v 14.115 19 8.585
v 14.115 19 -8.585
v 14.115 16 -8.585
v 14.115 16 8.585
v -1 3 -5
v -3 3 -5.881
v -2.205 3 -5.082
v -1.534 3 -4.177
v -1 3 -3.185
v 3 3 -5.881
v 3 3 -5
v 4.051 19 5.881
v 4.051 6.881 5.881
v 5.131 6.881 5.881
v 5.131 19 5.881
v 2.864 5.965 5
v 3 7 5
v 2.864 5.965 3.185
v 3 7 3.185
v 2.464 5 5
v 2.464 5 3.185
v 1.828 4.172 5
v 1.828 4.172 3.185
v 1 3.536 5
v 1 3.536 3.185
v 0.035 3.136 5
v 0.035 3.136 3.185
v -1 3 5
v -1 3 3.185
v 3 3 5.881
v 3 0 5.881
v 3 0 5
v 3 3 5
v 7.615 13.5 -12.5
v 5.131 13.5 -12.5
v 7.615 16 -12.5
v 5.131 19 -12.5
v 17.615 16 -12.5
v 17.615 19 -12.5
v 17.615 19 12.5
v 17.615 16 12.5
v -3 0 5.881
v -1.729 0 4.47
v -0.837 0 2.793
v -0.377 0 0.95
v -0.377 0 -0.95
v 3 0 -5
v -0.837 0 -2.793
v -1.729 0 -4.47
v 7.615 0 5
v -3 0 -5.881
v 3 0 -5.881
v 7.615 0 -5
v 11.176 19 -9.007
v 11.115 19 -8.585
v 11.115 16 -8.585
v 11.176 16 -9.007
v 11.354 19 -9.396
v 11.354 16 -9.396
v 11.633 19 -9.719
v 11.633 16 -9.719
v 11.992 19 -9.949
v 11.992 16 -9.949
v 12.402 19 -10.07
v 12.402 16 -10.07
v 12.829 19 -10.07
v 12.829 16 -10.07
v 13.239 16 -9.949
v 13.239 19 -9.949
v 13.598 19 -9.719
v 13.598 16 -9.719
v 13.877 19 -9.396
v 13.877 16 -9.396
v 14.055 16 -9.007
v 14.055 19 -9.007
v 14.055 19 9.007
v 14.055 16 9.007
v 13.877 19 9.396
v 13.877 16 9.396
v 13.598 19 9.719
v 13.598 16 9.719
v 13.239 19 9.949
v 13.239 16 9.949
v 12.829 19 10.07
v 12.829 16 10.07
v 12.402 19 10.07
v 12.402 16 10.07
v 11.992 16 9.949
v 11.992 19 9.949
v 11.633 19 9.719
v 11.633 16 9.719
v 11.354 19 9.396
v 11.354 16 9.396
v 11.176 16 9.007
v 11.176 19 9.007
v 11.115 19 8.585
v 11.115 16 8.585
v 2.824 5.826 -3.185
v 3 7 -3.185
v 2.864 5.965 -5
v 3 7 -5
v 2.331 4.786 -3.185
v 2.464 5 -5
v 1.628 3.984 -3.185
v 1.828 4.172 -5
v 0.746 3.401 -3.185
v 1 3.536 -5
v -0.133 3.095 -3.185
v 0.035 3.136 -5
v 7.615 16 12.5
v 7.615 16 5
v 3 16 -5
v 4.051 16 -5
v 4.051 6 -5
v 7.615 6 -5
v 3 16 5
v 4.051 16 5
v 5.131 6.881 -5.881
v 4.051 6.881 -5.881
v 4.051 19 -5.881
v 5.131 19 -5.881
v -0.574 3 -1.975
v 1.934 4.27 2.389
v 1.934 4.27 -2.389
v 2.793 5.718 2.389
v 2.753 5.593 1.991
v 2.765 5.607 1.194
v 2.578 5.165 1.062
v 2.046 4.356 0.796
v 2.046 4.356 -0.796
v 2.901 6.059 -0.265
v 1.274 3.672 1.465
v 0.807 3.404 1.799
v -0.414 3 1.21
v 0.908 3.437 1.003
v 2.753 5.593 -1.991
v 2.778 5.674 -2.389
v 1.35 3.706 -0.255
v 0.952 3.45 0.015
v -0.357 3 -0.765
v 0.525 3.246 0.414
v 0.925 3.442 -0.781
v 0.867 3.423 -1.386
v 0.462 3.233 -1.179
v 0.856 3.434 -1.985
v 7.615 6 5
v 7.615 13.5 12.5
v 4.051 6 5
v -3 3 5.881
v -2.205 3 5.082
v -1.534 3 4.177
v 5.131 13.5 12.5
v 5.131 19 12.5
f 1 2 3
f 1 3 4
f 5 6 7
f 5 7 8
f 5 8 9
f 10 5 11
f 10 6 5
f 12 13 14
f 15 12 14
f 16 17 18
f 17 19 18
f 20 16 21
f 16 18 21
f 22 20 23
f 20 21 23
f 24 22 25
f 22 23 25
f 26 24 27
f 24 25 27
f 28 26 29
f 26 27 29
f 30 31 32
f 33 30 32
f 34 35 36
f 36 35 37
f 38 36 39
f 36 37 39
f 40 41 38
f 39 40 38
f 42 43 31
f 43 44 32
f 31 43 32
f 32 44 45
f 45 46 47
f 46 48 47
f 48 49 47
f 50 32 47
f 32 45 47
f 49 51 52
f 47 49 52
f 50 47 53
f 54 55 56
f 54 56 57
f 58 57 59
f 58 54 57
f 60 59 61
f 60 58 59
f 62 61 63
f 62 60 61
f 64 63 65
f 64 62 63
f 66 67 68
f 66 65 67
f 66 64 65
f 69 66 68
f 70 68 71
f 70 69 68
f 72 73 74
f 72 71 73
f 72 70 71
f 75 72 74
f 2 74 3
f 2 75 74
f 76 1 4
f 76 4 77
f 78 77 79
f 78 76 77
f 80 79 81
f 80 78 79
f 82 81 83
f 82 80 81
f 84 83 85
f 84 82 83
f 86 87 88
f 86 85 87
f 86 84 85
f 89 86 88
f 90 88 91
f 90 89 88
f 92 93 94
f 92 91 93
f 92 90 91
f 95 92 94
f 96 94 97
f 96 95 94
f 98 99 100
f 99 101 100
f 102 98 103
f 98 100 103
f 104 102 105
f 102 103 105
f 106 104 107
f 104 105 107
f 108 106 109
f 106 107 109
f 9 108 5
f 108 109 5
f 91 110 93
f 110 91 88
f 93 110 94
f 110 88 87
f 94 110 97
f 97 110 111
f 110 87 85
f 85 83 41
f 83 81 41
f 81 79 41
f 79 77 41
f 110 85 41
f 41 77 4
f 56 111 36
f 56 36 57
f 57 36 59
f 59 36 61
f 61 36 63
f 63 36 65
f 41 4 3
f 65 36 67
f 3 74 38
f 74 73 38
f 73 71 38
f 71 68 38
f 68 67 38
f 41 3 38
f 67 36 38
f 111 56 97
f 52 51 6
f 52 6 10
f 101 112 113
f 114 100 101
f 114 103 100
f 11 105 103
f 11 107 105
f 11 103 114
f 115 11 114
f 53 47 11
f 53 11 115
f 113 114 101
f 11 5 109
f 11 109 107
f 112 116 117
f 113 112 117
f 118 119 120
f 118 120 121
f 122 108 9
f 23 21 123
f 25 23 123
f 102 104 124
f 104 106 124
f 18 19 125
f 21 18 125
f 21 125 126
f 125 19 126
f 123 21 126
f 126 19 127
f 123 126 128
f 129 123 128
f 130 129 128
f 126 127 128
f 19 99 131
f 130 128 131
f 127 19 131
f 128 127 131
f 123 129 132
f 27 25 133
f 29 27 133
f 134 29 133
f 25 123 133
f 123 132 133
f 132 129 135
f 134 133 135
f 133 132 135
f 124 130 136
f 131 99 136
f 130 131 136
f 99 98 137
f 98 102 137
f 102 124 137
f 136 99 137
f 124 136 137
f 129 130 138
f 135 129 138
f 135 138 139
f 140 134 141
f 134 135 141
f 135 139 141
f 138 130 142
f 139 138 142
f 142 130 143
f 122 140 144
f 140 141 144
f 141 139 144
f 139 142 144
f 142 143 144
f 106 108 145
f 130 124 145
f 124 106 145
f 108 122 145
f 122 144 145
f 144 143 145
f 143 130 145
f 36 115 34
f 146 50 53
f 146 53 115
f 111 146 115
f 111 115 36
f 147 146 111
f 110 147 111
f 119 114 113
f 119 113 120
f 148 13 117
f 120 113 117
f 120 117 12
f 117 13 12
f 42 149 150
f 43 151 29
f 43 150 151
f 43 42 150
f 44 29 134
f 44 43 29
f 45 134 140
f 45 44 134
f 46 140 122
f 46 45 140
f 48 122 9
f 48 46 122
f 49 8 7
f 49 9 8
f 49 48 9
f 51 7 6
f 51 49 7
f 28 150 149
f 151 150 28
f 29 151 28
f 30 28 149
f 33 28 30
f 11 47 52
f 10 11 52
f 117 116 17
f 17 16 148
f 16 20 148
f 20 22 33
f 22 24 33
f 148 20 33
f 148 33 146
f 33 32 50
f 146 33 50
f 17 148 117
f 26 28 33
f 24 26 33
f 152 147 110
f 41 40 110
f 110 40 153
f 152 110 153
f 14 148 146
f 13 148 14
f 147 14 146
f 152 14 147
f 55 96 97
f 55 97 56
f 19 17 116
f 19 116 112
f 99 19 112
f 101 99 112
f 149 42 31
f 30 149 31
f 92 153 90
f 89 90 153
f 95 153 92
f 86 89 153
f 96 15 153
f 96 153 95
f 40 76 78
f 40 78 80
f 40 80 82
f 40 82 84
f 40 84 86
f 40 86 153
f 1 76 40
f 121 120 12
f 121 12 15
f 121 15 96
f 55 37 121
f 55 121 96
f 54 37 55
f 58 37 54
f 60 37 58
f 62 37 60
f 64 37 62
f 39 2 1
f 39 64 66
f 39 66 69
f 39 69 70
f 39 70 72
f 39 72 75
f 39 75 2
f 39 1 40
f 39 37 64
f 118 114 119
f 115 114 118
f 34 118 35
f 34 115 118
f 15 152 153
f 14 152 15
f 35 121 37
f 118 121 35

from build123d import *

# Parameters (mm, degrees)
SKETCH1_R               = 1.5
BOSS_EXTRUDE1_DEPTH     = 3
SKETCH3_W               = 4.615398666
SKETCH3_H               = 10
BOSS_EXTRUDE2_DEPTH     = 12.9997796
FILLET7_R               = 1
CUT_EXTRUDE4_DEPTH      = 10
SKETCH9_W               = 13.564457496
SKETCH9_H               = 25
SKETCH9_R               = 1.5
BOSS_EXTRUDE3_DEPTH     = 3
CHAMFER1_SIZE           = 10
CHAMFER2_SIZE           = 10
FILLET8_R               = 4
CUT_EXTRUDE5_DEPTH      = 27.880201216
CUT_EXTRUDE5_DEPTH_BACK = 27.880201216
SKETCH10_W              = 8.131195533
SKETCH10_H              = 6.749631571
SKETCH10_H_2            = 7.013496214
CUT_EXTRUDE6_DEPTH      = 10


with BuildPart() as part:
    # Sketch1 → Boss-Extrude1 (new body)
    with BuildSketch(Plane(origin=(0, 0, 0), x_dir=(1, 0, 0), z_dir=(0, 1, 0))):
        Polygon((-3, -11.32792047), (3, -11.32792047), (3, -5), (7.615398666, -5), (7.615398666, 5), (3, 5), (3, 11.32792047), (-3, 11.32792047), align=None)
        with Locations(Location((0, 8.5, 0), (0, 0, 270))):
            Circle(SKETCH1_R, mode=Mode.SUBTRACT)
        with Locations(Location((0, -8.5, 0), (0, 0, 270))):
            Circle(SKETCH1_R, mode=Mode.SUBTRACT)
    extrude(amount=BOSS_EXTRUDE1_DEPTH)

    # Sketch3 → Boss-Extrude2 (add)
    with BuildSketch(Plane(origin=(0, 3, 0), x_dir=(1, 0, 0), z_dir=(0, 1, 0))):
        with Locations((5.307699333, 0)):
            Rectangle(SKETCH3_W, SKETCH3_H)
    extrude(amount=BOSS_EXTRUDE2_DEPTH)

    # Fillet7
    fillet7_edges = [part.edges().sort_by_distance(p)[0] for p in [
        (3, 1.5, 11.32792047),
        (3, 1.5, -11.32792047),
    ]]
    fillet(fillet7_edges, radius=FILLET7_R)

    # Sketch7 → Cut-Extrude4 (cut)
    with BuildSketch(Plane.XZ):
        with BuildLine():
            Line((-3.65526474, -6.392053518), (-3.78188192, 6.478485425))
            ThreePointArc((-3.78188192, 6.478485425), (-0.319780446, 0.076652438), (-3.65526474, -6.392053518))
        make_face()
    extrude(amount=-CUT_EXTRUDE4_DEPTH, mode=Mode.SUBTRACT)

    # Sketch9 → Boss-Extrude3 (add)
    with BuildSketch(Plane(origin=(0, 15.9997796, 0), x_dir=(1, 0, 0), z_dir=(0, 1, 0))):
        with Locations((10.833169918, 0)):
            Rectangle(SKETCH9_W, SKETCH9_H)
        with Locations(Location((12.615398666, 6, 0), (0, 0, 270))):
            Circle(SKETCH9_R, mode=Mode.SUBTRACT)
        with Locations(Location((12.615398666, -6, 0), (0, 0, 270))):
            Circle(SKETCH9_R, mode=Mode.SUBTRACT)
    extrude(amount=BOSS_EXTRUDE3_DEPTH)

    # Chamfer1
    # the kernel refuses this chamfer: 10 mm, written as the material it adds along each edge
    with BuildSketch(Plane(origin=(4.05094117, 15.9997796, 5), x_dir=(0, -0.9996219169112968, -0.027495876610586403), z_dir=(1, 0, 0))) as chamfer1_piece_1_section:
        Polygon((CHAMFER1_SIZE * 0.999621916911, -CHAMFER1_SIZE * 0.0274958766106), (-CHAMFER1_SIZE * 0.0274958766106, -CHAMFER1_SIZE * 0.999621916911), (0, 0), align=None)
    chamfer1_piece_1 = extrude(amount=3.564457497, mode=Mode.PRIVATE)
    chamfer1_piece_1 = split(chamfer1_piece_1, bisect_by=Plane(origin=(5.833169918, 12.4997796, 12.5), z_dir=(0, 0, -1)), keep=Keep.TOP, mode=Mode.PRIVATE)
    add(chamfer1_piece_1)

    # Chamfer2
    # the kernel refuses this chamfer: 10 mm, written as the material it adds along each edge
    with BuildSketch(Plane(origin=(7.615398666, 15.9997796, -5), x_dir=(0, -0.9996219169112968, 0.027495876610586403), z_dir=(-1, 0, 0))) as chamfer2_piece_1_section:
        Polygon((CHAMFER2_SIZE * 0.999621916911, -CHAMFER2_SIZE * 0.0274958766106), (-CHAMFER2_SIZE * 0.0274958766106, -CHAMFER2_SIZE * 0.999621916911), (0, 0), align=None)
    chamfer2_piece_1 = extrude(amount=3.564457497, mode=Mode.PRIVATE)
    chamfer2_piece_1 = split(chamfer2_piece_1, bisect_by=Plane(origin=(5.833169918, 12.4997796, -12.5), z_dir=(0, 0, 1)), keep=Keep.TOP, mode=Mode.PRIVATE)
    add(chamfer2_piece_1)

    # Fillet8
    fillet8_edges = [part.edges().sort_by_distance(p)[0] for p in [
        (3, 3, 0),
    ]]
    fillet(fillet8_edges, radius=FILLET8_R)

    # Sketch10 → Cut-Extrude5 (cut, two sides: drawn at the far end of the back side and taken through both)
    with BuildSketch(Plane(origin=(0, 3, 0), x_dir=(1, 0, 0), z_dir=(0, 1, 0)).offset(-CUT_EXTRUDE5_DEPTH_BACK)):
        with Locations((1.065597767, 9.256059268)):
            Rectangle(SKETCH10_W, SKETCH10_H)
        with Locations((1.065597767, -9.38799159)):
            Rectangle(SKETCH10_W, SKETCH10_H_2)
    extrude(amount=CUT_EXTRUDE5_DEPTH + CUT_EXTRUDE5_DEPTH_BACK, mode=Mode.SUBTRACT)

    # Sketch11 → Cut-Extrude6 (cut)
    with BuildSketch(Plane(origin=(0, 18.9997796, 0), x_dir=(1, 0, 0), z_dir=(0, 1, 0))):
        with BuildLine():
            Line((14.115398666, 8.584889461), (14.115398666, -8.584889461))
            ThreePointArc((14.115398666, -8.584889461), (12.615398666, -10.084889461), (11.115398666, -8.584889461))
            Line((11.115398666, -8.584889461), (11.115398666, 8.584889461))
            ThreePointArc((11.115398666, 8.584889461), (12.615398666, 10.084889461), (14.115398666, 8.584889461))
        make_face()
    extrude(amount=-CUT_EXTRUDE6_DEPTH, mode=Mode.SUBTRACT)


solid = part.part
